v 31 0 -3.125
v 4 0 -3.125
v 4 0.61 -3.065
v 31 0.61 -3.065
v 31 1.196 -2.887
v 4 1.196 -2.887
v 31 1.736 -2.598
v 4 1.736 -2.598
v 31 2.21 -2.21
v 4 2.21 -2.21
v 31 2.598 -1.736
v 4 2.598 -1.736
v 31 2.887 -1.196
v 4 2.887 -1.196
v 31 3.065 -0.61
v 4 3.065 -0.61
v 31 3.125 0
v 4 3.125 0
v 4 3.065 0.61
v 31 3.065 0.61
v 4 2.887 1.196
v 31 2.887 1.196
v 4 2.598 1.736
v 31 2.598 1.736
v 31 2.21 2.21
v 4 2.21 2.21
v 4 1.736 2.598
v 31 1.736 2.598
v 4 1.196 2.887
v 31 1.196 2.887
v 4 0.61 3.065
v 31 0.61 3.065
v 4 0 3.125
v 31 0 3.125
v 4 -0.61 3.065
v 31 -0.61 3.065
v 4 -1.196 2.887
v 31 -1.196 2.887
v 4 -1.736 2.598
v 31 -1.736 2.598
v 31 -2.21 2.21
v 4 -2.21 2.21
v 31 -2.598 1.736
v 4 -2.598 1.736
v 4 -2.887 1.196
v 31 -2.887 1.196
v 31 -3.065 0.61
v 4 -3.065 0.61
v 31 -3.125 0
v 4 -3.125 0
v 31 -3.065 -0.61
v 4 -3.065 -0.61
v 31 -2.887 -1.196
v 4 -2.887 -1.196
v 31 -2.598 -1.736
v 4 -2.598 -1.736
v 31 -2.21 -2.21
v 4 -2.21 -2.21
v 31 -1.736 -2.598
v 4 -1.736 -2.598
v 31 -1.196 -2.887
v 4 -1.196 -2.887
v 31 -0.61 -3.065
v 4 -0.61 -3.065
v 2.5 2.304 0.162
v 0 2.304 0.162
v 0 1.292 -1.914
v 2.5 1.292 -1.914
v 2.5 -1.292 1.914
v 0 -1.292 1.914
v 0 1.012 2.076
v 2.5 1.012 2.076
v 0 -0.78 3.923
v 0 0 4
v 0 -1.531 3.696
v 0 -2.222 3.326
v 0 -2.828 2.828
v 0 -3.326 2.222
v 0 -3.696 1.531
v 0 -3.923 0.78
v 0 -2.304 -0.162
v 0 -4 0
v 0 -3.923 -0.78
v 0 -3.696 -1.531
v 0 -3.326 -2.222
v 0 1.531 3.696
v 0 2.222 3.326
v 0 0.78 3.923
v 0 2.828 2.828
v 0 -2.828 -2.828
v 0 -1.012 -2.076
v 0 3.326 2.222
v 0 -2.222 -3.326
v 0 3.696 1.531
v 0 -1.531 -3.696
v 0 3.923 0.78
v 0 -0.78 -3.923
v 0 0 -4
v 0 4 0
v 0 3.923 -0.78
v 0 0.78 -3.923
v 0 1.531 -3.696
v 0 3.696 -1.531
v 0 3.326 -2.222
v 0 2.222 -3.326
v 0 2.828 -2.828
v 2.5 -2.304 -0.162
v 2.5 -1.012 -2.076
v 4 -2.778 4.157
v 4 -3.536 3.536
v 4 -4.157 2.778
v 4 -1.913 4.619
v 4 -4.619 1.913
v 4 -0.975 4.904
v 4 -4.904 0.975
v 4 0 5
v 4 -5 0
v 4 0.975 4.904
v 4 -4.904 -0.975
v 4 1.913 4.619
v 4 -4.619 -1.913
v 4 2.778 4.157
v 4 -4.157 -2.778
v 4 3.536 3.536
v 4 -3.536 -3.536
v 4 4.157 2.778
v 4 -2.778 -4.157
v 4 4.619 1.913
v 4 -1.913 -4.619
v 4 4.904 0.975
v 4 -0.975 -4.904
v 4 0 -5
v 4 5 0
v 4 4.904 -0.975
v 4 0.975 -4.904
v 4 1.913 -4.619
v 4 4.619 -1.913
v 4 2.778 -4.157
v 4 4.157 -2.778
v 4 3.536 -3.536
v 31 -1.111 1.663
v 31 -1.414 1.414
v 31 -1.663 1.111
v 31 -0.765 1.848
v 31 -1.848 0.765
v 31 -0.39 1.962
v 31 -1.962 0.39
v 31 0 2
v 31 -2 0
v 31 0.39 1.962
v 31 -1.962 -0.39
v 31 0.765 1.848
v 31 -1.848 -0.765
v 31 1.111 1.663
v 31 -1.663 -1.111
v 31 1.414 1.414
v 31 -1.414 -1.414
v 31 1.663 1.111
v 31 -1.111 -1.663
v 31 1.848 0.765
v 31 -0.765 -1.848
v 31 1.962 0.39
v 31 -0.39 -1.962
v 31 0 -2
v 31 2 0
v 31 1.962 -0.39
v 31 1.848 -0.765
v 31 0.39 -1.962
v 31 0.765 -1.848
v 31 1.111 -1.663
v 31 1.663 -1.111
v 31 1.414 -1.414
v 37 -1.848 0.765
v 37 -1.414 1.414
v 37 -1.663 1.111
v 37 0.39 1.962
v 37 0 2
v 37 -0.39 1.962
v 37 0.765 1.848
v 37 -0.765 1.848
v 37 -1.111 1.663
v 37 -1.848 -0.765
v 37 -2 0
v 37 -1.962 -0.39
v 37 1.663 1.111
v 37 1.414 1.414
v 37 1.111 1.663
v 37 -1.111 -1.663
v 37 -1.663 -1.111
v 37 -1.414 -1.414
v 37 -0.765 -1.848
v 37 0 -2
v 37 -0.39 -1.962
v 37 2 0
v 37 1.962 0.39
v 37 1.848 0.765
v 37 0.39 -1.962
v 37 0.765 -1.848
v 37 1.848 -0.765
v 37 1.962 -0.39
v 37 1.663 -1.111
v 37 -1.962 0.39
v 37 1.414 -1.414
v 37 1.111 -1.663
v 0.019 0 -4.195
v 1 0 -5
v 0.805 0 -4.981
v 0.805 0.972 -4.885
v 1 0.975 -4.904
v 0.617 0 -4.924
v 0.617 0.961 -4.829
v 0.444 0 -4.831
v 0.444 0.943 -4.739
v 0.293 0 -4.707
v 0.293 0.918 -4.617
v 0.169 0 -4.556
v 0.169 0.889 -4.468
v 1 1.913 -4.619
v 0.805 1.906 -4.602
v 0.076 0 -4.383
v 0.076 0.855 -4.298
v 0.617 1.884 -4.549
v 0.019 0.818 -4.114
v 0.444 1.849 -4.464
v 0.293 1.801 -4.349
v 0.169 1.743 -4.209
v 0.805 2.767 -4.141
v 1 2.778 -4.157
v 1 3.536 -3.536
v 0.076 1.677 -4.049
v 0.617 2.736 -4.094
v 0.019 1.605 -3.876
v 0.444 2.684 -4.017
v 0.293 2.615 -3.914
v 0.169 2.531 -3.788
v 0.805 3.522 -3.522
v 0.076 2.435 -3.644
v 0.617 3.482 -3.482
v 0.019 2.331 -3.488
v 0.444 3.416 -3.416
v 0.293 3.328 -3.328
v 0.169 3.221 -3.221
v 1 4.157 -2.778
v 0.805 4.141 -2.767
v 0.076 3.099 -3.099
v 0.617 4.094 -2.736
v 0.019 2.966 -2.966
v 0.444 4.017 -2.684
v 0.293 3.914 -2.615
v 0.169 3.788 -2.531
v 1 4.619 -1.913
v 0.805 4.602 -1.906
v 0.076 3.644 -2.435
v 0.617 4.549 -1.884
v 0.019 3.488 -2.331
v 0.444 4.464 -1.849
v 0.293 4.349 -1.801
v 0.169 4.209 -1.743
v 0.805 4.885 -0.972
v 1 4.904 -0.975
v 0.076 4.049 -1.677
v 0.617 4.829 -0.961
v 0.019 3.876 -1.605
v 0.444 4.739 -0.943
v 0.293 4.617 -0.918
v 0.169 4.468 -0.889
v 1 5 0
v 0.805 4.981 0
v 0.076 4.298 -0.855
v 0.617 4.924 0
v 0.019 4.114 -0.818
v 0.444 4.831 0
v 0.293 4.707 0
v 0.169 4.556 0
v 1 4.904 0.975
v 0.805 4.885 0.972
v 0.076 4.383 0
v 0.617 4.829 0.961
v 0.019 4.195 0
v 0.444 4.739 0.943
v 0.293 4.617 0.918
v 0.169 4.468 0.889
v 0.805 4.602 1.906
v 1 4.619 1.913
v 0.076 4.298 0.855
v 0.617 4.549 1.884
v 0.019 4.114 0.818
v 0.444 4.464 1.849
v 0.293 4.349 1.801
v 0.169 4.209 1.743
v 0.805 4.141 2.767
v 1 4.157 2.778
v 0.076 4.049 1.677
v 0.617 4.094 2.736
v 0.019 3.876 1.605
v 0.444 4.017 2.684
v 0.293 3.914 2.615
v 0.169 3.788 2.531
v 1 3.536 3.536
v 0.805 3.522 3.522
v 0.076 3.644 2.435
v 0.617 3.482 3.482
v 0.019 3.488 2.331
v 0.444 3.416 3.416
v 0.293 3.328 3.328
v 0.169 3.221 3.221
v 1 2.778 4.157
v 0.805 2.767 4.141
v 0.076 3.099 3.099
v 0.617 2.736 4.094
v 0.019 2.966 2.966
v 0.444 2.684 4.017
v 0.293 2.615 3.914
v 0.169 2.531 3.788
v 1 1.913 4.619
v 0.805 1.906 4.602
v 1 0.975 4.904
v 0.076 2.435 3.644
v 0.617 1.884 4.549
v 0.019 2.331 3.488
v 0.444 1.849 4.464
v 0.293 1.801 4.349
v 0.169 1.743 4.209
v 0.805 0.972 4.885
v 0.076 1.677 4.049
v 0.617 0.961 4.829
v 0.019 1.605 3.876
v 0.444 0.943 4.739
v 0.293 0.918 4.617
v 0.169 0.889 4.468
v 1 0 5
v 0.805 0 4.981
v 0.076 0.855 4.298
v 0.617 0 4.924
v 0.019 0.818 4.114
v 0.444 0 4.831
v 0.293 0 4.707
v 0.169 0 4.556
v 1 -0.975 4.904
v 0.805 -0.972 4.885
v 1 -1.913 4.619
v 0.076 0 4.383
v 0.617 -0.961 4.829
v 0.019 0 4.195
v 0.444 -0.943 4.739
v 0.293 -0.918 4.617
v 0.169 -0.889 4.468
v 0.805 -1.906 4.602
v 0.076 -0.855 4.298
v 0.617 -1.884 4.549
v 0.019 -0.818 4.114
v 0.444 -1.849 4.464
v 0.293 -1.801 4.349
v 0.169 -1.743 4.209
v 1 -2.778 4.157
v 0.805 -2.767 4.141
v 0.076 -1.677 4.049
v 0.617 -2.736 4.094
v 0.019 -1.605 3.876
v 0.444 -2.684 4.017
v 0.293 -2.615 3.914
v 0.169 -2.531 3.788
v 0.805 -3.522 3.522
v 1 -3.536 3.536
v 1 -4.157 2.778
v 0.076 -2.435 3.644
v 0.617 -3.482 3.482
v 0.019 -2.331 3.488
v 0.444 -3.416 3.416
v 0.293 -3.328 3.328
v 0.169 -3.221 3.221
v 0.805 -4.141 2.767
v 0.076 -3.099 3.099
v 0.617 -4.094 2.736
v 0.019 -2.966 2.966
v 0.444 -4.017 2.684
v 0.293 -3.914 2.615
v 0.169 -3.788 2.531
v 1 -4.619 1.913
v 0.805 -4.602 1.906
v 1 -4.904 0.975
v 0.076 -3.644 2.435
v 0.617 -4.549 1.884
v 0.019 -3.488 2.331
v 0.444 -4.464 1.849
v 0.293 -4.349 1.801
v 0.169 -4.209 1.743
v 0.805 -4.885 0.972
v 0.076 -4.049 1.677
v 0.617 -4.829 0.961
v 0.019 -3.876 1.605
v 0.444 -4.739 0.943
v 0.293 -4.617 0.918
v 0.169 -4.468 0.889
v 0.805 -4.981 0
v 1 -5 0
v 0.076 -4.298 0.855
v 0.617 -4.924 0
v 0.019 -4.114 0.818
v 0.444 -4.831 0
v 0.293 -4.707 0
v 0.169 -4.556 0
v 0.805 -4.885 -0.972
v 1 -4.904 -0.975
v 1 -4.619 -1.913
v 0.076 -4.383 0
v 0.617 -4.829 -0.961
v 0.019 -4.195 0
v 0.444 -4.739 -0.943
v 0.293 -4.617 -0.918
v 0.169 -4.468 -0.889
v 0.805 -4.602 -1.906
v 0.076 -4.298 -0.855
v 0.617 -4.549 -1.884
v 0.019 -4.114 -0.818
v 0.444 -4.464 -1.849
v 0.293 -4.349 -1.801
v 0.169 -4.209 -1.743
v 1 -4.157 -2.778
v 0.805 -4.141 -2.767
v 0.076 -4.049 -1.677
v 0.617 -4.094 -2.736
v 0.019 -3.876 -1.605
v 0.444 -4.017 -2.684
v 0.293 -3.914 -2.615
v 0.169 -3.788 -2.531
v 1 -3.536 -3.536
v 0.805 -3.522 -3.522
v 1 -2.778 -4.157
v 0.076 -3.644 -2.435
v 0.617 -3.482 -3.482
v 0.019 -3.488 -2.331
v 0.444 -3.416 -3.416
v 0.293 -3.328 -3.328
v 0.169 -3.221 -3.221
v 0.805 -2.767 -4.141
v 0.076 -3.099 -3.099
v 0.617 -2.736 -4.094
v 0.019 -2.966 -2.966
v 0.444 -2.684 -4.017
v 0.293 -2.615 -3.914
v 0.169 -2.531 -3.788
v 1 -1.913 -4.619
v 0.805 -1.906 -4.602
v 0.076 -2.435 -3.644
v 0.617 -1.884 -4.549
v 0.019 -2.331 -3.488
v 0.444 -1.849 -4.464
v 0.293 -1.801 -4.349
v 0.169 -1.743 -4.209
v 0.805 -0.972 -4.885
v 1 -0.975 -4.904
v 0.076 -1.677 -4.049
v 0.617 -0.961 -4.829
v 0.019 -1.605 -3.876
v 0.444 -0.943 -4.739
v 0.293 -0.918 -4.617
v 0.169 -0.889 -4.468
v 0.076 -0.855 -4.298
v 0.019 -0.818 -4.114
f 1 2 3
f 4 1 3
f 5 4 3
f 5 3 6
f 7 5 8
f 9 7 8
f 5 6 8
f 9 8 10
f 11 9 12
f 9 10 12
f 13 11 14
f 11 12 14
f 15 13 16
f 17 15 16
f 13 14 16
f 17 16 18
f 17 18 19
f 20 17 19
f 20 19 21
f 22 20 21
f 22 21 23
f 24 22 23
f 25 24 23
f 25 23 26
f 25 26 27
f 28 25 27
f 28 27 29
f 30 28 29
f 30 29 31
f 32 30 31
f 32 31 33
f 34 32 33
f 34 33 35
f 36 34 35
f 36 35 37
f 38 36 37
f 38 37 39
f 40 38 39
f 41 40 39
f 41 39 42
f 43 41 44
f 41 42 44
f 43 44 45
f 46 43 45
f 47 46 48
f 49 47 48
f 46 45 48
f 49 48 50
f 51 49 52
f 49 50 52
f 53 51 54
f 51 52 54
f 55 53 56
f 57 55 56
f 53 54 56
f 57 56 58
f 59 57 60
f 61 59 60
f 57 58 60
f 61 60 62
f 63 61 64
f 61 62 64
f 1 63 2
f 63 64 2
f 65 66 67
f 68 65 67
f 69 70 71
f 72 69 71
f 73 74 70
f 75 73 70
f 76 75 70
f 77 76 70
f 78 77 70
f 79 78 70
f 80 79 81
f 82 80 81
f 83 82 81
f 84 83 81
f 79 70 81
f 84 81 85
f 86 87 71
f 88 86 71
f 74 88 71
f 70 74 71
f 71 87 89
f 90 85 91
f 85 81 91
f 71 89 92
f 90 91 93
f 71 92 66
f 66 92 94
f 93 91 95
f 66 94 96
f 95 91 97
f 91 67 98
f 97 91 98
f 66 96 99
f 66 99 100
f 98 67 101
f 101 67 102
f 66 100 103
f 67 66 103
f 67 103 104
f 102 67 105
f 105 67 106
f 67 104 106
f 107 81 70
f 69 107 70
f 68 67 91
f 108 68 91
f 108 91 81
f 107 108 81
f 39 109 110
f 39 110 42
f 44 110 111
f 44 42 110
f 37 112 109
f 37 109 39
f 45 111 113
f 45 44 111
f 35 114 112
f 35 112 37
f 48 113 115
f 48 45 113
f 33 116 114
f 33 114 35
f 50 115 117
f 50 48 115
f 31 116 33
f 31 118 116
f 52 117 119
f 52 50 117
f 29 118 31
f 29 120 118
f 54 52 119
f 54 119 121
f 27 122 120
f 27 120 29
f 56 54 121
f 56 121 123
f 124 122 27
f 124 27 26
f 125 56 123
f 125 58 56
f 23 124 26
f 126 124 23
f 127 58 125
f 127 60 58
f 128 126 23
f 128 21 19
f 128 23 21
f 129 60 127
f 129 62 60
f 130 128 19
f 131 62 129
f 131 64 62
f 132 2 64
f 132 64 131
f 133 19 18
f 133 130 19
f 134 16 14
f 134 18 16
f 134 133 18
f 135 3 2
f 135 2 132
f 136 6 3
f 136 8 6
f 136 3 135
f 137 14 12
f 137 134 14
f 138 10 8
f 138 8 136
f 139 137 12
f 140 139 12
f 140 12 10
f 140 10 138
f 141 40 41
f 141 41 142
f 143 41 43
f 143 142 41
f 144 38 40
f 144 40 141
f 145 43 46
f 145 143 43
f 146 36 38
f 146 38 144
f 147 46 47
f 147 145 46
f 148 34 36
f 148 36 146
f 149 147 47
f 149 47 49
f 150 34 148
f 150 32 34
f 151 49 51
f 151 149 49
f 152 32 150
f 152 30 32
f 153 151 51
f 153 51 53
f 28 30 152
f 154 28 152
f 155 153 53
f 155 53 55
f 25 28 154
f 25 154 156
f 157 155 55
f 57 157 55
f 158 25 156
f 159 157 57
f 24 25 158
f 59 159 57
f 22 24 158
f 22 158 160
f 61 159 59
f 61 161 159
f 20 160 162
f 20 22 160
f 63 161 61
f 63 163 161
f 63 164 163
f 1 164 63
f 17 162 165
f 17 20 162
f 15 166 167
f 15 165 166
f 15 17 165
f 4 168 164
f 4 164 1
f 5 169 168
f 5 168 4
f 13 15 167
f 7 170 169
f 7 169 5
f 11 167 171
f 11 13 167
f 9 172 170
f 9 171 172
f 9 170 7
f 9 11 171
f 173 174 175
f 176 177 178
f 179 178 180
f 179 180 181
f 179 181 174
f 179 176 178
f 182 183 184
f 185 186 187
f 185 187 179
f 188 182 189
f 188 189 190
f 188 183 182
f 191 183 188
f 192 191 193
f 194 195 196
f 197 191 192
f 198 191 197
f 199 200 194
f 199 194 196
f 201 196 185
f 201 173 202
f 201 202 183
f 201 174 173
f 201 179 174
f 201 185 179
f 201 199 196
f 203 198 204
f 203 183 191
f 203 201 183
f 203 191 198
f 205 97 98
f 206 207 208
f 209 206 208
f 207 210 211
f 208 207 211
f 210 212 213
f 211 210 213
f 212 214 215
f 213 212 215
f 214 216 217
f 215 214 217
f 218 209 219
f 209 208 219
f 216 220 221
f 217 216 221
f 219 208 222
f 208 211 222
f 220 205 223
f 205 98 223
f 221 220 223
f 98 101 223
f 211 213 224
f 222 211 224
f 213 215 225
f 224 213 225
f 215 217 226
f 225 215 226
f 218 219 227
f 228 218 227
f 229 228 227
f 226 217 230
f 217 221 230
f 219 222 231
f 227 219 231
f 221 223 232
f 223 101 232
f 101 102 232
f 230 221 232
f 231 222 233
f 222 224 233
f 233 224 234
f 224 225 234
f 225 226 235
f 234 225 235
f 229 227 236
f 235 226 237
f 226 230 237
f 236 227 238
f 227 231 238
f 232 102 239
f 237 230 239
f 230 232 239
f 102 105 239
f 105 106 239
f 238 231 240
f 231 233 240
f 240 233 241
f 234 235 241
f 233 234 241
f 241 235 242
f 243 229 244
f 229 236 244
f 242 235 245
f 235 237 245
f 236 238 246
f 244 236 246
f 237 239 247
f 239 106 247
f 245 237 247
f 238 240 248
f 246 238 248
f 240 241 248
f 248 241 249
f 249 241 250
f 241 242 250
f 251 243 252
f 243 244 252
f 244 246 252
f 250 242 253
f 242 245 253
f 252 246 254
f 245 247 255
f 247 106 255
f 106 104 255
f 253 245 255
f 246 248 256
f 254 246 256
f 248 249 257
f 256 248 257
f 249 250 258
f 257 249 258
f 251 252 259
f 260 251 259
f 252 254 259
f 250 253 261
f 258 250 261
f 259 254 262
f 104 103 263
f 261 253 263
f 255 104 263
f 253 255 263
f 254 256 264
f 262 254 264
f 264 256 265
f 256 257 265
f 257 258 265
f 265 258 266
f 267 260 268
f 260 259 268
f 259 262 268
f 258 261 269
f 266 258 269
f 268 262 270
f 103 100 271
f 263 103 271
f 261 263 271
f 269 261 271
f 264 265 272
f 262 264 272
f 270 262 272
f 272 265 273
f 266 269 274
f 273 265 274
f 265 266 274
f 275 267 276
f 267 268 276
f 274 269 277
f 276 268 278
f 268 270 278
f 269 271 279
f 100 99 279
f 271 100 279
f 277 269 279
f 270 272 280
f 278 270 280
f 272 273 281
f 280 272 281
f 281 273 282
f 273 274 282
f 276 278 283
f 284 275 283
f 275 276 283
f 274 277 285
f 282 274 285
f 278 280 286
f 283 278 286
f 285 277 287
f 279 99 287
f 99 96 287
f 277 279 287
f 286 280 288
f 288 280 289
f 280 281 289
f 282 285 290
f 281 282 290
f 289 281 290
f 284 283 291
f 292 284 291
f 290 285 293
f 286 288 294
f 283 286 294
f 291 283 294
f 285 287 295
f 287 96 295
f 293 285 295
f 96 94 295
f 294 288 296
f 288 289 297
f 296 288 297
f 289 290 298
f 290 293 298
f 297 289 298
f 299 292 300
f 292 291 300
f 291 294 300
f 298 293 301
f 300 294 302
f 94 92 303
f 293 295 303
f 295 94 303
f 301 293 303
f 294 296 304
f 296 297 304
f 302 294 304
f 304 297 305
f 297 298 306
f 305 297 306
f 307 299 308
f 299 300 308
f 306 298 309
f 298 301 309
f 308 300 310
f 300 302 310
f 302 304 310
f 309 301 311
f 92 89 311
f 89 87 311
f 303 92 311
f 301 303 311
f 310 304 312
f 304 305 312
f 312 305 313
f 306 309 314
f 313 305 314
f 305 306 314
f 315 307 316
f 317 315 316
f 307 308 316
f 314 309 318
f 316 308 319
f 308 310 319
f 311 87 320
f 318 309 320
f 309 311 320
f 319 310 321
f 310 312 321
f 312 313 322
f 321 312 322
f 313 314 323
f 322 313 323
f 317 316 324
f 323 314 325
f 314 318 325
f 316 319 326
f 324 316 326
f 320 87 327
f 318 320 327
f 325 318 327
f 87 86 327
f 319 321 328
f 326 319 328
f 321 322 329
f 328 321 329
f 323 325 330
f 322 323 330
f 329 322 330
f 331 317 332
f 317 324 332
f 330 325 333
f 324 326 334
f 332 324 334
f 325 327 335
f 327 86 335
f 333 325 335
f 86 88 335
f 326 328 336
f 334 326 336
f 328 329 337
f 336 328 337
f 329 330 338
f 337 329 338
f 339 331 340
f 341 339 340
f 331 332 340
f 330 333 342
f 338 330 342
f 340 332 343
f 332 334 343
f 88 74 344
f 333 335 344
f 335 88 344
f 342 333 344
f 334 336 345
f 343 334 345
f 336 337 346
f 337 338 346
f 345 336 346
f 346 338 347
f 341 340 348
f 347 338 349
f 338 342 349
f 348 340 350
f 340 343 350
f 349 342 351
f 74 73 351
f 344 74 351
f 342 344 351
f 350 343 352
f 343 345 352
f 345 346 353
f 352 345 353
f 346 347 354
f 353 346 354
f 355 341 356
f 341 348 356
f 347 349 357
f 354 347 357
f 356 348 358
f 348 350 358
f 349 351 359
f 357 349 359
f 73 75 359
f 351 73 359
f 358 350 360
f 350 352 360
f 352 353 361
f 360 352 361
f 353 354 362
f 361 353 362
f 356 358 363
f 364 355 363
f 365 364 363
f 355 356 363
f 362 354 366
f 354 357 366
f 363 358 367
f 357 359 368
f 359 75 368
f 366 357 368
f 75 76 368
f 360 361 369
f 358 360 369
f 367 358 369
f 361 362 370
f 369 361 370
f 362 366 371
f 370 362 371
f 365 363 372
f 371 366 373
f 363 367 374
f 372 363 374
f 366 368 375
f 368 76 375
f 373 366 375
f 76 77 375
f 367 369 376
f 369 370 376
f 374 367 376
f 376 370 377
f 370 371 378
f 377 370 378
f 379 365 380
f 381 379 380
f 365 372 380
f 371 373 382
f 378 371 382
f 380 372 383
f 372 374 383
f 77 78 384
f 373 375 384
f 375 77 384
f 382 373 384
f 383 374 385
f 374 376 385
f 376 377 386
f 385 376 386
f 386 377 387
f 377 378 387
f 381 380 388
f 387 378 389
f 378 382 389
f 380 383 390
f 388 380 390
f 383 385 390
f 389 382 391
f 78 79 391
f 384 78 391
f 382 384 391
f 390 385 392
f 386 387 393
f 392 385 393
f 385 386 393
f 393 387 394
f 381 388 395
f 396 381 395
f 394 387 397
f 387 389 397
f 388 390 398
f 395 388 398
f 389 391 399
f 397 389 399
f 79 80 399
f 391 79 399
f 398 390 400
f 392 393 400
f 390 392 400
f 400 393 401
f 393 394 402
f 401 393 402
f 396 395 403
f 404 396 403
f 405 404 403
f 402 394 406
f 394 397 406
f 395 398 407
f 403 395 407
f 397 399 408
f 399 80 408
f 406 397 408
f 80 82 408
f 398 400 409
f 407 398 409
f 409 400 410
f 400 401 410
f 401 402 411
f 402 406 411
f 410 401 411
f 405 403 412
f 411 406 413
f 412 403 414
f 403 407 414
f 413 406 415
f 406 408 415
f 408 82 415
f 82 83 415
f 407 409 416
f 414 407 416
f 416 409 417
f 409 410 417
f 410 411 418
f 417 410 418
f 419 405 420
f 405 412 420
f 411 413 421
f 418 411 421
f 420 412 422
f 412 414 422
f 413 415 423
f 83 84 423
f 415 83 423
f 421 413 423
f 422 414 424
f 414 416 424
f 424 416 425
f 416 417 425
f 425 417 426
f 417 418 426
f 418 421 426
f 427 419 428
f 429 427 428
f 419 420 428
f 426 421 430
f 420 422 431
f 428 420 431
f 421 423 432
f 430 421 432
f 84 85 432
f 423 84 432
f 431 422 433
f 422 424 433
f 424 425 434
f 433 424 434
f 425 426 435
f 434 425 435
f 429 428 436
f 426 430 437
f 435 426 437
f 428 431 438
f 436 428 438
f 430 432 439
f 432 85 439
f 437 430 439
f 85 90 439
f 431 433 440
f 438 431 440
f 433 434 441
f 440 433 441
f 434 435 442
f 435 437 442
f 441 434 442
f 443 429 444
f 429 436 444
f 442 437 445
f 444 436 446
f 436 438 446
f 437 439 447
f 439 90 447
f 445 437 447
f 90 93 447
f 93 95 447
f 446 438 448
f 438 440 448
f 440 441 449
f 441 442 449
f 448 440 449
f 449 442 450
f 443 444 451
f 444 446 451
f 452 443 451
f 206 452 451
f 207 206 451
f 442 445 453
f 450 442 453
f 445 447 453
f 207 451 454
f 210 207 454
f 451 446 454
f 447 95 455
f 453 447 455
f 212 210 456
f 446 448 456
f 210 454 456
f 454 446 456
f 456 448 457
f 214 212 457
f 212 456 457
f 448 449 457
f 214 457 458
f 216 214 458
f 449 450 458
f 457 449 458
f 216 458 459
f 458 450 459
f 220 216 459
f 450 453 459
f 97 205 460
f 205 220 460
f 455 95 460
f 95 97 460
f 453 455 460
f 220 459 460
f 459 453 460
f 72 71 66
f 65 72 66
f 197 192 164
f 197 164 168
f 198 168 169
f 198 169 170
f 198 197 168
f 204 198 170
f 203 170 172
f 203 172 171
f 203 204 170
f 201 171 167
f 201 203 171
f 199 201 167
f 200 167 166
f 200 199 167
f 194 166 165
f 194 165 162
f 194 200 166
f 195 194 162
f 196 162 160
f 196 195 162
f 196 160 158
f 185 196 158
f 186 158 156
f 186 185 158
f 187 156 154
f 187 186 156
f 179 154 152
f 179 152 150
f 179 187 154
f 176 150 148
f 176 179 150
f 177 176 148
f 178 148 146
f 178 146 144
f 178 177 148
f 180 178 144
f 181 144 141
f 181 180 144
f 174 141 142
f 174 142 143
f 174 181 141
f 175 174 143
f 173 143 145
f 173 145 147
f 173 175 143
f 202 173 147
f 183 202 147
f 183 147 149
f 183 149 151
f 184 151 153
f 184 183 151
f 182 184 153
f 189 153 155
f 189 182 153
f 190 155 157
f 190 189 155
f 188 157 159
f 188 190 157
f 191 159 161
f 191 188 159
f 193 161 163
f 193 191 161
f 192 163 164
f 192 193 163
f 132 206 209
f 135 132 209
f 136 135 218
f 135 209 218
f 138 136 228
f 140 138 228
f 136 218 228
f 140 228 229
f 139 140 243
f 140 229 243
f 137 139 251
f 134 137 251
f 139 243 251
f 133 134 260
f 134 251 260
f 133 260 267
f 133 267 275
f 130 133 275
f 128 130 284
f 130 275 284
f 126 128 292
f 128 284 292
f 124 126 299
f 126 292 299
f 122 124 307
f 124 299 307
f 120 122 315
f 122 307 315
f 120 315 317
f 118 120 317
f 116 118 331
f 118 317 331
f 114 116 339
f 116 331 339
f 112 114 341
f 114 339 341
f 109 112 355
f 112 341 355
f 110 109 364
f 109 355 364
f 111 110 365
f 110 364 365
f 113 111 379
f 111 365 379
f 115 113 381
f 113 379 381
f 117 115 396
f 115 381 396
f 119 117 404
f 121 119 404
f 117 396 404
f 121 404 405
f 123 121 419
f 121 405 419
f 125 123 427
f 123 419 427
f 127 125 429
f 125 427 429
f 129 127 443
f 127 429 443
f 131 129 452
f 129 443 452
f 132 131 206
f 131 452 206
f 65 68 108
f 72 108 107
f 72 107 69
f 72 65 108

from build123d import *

# Parameters (mm, degrees)
SKETCH2_R           = 5
BOSS_EXTRUDE1_DEPTH = 4
FILLET1_R           = 1
CUT_EXTRUDE2_DEPTH  = 2.5
SKETCH4_R           = 3.125
BOSS_EXTRUDE3_DEPTH = 33
SKETCH5_R           = 3.125
SKETCH5_R_2         = 2
CUT_EXTRUDE4_DEPTH  = 6


with BuildPart() as part:
    # Sketch2 → Boss-Extrude1 (new body)
    with BuildSketch(Plane(origin=(0, 0, 0), x_dir=(0, 0, -1), z_dir=(1, 0, 0))):
        Circle(SKETCH2_R)
    extrude(amount=BOSS_EXTRUDE1_DEPTH)

    # Fillet1
    fillet1_edges = [part.edges().sort_by_distance(p)[0] for p in [
        (0, 0, 5),
    ]]
    fillet(fillet1_edges, radius=FILLET1_R)

    # Sketch3 → Cut-Extrude2 (cut)
    with BuildSketch(Plane.ZY):
        Polygon((2.075995504, 1.011719328), (0.161823113, 2.303724509), (-1.914172392, 1.292005181), (-2.075995504, -1.011719328), (-0.161823113, -2.303724509), (1.914172392, -1.292005181), align=None)
    extrude(amount=-CUT_EXTRUDE2_DEPTH, mode=Mode.SUBTRACT)

    # Sketch4 → Boss-Extrude3 (add)
    with BuildSketch(Plane(origin=(4, 0, 0), x_dir=(0, 0, -1), z_dir=(1, 0, 0))):
        Circle(SKETCH4_R)
    extrude(amount=BOSS_EXTRUDE3_DEPTH)

    # Sketch5 → Cut-Extrude4 (cut)
    with BuildSketch(Plane(origin=(37, 0, 0), x_dir=(0, 0, -1), z_dir=(1, 0, 0))):
        Circle(SKETCH5_R)
        Circle(SKETCH5_R_2, mode=Mode.SUBTRACT)
    extrude(amount=-CUT_EXTRUDE4_DEPTH, mode=Mode.SUBTRACT)


solid = part.part
